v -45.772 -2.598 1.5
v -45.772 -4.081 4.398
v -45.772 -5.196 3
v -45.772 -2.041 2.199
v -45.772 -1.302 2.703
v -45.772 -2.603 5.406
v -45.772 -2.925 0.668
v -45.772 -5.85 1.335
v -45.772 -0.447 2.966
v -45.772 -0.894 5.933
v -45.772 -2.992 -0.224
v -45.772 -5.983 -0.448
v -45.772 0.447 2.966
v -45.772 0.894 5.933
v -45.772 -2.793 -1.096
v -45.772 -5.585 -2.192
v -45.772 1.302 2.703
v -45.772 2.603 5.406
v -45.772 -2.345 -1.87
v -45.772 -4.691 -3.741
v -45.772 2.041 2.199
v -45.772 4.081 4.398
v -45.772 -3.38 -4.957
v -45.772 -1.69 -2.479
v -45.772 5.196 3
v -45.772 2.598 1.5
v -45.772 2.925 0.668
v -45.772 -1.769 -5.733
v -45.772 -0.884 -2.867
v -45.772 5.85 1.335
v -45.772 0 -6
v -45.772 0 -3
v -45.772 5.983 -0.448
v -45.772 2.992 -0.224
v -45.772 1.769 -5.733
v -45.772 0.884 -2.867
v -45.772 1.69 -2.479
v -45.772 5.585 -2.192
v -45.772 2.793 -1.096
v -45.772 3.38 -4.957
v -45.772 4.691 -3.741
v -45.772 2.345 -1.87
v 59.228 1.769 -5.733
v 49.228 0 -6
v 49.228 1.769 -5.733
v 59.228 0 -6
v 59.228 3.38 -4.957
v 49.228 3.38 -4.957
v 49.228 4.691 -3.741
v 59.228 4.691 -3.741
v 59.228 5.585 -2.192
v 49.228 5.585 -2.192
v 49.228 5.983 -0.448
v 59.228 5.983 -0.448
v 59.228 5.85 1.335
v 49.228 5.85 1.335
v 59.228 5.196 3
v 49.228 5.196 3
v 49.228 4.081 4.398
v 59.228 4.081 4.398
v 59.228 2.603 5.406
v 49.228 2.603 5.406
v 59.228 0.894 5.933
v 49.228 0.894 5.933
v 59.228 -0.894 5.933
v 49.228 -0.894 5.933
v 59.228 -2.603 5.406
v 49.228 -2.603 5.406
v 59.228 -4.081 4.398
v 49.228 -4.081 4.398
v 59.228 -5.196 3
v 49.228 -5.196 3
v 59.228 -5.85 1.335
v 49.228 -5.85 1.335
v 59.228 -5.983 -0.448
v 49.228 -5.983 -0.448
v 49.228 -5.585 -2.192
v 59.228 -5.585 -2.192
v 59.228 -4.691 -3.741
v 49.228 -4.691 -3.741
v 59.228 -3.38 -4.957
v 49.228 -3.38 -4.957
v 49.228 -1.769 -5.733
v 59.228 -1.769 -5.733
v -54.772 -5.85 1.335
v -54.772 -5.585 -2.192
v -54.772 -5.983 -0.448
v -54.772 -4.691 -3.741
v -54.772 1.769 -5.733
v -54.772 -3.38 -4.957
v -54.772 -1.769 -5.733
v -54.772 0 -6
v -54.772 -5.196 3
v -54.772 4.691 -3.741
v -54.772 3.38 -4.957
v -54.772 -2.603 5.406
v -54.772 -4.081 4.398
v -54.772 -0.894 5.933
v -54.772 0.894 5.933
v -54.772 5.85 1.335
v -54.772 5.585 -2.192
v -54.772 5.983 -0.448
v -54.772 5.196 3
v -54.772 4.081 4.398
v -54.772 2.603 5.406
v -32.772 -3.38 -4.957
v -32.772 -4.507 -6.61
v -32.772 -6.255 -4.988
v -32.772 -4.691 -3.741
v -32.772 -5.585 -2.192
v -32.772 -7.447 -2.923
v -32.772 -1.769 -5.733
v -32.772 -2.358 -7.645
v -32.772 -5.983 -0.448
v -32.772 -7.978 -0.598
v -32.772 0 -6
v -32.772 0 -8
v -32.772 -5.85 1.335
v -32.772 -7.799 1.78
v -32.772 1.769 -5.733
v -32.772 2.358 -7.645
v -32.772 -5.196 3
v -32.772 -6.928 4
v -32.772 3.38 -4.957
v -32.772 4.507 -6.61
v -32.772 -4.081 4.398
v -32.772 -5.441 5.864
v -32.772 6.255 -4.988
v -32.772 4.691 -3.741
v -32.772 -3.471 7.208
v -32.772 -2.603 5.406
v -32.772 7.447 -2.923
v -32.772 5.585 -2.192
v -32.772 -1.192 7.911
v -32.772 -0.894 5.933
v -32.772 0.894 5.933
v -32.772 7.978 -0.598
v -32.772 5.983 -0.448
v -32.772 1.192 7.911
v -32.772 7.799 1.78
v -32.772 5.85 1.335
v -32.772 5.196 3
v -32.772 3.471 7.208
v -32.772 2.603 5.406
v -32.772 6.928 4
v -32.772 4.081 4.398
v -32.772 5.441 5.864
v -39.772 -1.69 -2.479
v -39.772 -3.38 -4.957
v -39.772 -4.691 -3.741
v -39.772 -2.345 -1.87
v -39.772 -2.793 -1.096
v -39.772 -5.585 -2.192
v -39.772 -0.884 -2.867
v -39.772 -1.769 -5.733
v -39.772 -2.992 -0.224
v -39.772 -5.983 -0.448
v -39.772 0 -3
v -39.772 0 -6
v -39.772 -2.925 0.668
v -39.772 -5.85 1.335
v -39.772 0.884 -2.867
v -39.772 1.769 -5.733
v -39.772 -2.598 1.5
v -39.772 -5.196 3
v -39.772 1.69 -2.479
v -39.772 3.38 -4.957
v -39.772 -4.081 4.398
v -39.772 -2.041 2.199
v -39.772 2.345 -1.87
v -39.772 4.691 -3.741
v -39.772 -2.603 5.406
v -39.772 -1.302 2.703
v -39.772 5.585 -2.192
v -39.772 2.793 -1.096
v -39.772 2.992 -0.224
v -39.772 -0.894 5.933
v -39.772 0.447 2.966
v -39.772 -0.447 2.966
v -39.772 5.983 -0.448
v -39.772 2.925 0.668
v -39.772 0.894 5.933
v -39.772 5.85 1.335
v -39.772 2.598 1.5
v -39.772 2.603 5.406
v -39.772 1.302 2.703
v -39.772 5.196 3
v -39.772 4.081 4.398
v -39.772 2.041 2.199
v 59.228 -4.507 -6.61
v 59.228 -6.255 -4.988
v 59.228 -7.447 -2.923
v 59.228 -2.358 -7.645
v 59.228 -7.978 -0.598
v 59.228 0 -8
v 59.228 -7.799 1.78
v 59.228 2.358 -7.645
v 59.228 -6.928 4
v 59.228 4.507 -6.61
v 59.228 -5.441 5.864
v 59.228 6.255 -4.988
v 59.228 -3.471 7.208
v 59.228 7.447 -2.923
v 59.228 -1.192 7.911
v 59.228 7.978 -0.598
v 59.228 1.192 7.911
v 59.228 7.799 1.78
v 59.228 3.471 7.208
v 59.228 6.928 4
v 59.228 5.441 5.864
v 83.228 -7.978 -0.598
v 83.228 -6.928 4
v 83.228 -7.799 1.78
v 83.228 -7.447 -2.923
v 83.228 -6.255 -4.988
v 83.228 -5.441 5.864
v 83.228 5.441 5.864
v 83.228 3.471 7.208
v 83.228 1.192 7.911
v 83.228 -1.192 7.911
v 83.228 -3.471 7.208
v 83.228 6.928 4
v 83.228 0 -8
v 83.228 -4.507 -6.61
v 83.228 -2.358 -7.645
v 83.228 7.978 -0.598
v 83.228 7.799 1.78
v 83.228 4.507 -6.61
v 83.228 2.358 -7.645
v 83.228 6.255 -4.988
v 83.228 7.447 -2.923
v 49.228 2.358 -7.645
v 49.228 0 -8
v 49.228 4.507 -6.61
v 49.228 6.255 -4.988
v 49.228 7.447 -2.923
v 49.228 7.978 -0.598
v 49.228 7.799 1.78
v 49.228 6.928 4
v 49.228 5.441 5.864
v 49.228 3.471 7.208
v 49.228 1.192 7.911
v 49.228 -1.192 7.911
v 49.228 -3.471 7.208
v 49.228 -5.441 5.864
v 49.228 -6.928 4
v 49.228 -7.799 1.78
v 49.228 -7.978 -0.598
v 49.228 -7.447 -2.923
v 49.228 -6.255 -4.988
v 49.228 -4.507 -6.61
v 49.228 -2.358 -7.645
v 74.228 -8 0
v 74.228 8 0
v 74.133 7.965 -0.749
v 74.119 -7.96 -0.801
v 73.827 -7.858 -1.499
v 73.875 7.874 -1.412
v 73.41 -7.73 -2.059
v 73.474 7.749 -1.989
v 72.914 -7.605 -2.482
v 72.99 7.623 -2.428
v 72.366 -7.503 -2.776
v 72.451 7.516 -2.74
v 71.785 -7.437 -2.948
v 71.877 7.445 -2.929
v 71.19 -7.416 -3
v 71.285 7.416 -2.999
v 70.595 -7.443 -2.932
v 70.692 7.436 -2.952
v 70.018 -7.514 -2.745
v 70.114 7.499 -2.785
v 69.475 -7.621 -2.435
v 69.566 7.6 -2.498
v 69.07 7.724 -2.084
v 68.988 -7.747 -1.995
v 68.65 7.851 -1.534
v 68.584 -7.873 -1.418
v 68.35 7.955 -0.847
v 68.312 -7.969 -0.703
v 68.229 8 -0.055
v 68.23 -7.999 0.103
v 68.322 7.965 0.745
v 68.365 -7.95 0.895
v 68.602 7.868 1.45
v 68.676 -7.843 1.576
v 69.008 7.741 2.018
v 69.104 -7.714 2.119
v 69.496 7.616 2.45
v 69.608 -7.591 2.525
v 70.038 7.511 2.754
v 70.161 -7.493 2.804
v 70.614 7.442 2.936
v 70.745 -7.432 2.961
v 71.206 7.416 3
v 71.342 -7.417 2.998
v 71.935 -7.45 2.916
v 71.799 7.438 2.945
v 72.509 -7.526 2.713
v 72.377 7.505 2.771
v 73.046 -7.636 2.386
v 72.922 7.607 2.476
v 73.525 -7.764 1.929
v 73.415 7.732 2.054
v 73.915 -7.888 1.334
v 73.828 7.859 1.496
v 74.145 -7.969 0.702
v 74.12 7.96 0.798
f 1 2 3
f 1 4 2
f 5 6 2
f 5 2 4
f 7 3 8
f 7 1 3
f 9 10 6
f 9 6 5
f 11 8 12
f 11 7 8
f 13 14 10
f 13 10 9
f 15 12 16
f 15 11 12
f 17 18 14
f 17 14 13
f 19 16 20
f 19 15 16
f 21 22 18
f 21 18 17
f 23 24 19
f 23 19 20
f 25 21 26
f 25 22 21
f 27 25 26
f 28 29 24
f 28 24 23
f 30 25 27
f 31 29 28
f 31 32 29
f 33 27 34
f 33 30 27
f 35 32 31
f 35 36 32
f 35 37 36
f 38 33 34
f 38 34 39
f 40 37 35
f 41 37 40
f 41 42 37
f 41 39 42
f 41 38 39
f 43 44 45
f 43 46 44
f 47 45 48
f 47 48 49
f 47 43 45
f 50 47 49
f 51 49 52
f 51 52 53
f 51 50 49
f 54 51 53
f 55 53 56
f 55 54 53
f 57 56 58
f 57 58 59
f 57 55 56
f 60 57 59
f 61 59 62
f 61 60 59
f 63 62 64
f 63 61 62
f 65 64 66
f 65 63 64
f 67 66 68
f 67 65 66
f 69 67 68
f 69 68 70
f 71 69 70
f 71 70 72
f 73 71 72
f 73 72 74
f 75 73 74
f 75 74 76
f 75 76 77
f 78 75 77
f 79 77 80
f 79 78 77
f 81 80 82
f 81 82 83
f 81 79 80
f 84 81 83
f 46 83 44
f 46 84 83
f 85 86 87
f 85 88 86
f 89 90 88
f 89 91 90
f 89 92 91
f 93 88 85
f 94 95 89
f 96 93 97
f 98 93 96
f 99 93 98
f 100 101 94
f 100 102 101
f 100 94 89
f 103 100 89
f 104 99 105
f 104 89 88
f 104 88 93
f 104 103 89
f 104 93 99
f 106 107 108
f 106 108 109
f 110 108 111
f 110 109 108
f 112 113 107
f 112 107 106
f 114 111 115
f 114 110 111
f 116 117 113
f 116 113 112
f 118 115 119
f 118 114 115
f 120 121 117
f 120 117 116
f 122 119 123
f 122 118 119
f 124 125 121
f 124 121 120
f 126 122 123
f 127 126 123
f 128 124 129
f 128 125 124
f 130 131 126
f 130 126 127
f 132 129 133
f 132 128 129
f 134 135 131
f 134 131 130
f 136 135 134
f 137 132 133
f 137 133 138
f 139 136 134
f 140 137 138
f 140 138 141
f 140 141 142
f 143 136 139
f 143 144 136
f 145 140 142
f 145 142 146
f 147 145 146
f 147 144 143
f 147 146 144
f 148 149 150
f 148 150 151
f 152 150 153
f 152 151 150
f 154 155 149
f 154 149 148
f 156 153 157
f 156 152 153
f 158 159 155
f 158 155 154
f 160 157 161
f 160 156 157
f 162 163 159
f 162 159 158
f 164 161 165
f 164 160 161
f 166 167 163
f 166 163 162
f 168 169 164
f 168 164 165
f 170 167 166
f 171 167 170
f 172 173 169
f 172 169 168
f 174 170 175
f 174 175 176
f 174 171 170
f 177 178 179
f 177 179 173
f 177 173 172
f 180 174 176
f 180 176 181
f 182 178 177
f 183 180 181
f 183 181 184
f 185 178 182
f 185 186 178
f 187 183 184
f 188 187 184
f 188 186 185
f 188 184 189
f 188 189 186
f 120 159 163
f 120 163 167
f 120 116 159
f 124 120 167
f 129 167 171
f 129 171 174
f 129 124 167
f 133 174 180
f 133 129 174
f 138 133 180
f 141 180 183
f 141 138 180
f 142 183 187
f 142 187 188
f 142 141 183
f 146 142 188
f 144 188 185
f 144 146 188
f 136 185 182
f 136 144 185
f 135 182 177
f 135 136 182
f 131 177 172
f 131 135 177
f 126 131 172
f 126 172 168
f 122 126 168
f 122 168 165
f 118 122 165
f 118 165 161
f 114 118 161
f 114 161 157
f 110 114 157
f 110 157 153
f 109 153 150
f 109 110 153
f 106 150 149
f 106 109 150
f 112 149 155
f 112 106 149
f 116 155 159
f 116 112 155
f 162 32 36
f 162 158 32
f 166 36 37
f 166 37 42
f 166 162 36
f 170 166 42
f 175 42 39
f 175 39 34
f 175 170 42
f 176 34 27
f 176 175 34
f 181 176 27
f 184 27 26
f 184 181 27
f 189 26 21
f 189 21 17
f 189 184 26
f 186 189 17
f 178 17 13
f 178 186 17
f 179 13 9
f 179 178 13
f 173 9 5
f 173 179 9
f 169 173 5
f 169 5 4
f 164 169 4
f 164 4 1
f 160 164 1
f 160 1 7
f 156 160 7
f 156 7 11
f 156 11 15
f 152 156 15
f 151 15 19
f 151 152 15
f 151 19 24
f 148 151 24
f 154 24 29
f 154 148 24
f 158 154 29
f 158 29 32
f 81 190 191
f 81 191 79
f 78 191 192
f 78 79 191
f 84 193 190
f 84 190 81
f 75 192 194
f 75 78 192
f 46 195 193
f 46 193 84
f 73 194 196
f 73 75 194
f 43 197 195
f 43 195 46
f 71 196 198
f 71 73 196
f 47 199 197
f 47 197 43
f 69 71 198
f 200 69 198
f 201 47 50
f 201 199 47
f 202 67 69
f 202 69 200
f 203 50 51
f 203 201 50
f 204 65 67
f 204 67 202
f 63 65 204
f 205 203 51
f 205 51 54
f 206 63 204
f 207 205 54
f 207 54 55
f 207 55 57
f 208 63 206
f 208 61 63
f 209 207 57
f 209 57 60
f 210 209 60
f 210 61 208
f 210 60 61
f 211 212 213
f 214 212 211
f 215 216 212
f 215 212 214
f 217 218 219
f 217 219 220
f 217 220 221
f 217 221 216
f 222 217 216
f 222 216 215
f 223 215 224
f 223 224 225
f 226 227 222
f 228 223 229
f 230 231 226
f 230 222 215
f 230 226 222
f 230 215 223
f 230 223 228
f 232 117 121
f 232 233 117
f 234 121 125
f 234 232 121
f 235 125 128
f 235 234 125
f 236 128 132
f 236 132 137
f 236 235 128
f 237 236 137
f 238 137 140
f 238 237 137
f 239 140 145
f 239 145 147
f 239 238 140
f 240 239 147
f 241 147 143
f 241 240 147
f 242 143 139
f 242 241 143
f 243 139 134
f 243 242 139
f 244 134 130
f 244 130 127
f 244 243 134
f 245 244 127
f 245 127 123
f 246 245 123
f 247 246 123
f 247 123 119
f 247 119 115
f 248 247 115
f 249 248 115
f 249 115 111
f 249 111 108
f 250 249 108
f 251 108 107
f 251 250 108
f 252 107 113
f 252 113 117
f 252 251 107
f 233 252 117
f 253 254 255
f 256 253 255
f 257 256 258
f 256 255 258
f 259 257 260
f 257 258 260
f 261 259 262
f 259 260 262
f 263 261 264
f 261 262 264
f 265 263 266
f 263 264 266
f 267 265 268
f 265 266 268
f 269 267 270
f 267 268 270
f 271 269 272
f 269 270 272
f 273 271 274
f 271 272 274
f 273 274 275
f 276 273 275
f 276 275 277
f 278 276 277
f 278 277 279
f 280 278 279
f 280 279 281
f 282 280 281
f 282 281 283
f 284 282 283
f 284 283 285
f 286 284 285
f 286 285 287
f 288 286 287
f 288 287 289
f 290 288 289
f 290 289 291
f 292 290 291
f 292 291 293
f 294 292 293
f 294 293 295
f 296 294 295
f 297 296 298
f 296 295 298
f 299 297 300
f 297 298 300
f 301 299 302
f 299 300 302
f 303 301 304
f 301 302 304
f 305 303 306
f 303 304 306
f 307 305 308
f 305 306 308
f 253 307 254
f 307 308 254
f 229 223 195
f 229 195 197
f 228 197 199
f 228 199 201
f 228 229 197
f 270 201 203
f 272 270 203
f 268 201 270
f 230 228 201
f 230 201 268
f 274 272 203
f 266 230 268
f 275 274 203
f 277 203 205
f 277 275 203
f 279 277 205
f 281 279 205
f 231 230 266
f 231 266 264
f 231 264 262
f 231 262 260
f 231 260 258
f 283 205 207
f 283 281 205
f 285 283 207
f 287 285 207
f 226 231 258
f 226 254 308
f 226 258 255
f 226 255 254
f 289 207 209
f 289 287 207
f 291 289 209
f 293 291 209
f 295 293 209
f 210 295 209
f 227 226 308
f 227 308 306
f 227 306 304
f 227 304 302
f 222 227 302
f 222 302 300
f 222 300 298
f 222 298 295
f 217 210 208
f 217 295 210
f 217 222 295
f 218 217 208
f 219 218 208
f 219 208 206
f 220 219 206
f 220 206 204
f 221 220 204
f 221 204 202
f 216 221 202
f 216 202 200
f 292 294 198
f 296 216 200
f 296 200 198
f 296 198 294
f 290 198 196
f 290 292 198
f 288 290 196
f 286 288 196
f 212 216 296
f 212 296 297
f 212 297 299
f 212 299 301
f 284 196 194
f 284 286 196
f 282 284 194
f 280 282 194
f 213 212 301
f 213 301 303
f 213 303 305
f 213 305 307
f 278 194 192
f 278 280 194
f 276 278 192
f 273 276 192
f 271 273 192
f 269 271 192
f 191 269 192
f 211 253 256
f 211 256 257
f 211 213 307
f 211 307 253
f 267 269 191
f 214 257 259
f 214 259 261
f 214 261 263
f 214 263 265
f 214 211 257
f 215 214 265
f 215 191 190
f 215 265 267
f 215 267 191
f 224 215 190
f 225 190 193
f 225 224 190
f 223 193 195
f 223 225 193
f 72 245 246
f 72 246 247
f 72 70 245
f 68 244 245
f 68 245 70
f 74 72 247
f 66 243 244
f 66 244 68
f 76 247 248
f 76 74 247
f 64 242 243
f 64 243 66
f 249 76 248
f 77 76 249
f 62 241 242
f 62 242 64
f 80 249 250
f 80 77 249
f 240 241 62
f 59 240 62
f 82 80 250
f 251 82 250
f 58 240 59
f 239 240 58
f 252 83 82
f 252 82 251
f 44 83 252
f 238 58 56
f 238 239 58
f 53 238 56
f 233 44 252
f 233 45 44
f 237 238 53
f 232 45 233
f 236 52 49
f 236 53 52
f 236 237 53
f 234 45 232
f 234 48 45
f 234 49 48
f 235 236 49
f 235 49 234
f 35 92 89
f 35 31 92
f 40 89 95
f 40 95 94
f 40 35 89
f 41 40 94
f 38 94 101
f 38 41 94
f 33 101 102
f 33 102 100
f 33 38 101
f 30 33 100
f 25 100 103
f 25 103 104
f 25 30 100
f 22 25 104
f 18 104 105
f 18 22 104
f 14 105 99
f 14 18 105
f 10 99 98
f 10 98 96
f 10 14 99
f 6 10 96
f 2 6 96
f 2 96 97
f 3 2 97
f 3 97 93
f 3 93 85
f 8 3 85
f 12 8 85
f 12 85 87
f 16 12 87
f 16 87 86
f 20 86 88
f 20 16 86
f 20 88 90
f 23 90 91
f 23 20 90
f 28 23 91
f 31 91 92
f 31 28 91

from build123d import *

# Parameters (mm, degrees)
CUT_EXTRUDE1_REACH = 18
SKETCH3_R          = 3


with BuildPart() as part:
    # Sketch1 → Revolve1 (revolve)
    with BuildSketch(Plane(origin=(0, 0, 0), x_dir=(1, 0, 0), z_dir=(0, 1, 0))):
        Polygon((-54.771838843, 0), (-54.771838843, 6), (-45.771838843, 6), (-45.771838843, 3), (-39.771838843, 3), (-39.771838843, 6), (-32.771838843, 6), (-32.771838843, 8), (49.228161157, 8), (49.228161157, 6), (59.228161157, 6), (59.228161157, 8), (83.228161157, 8), (83.228161157, 0), align=None)
    revolve(axis=Axis((-54.771838843, 0, 0), (1, 0, 0)))

    # Sketch3 → Cut-Extrude1 (cut, up to next)
    with BuildSketch(Plane(origin=(0, 8, 0), x_dir=(1, 0, 0), z_dir=(0, 1, 0)), mode=Mode.PRIVATE) as cut_extrude1_sk1:
        with Locations((71.228161157, 0)):
            Circle(SKETCH3_R)
    cut_extrude1_tool1 = extrude(cut_extrude1_sk1.sketch, amount=-CUT_EXTRUDE1_REACH, mode=Mode.PRIVATE) & part.part
    add(cut_extrude1_tool1.solids().sort_by_distance((71.228161, 8, 0))[0], mode=Mode.SUBTRACT)


solid = part.part
